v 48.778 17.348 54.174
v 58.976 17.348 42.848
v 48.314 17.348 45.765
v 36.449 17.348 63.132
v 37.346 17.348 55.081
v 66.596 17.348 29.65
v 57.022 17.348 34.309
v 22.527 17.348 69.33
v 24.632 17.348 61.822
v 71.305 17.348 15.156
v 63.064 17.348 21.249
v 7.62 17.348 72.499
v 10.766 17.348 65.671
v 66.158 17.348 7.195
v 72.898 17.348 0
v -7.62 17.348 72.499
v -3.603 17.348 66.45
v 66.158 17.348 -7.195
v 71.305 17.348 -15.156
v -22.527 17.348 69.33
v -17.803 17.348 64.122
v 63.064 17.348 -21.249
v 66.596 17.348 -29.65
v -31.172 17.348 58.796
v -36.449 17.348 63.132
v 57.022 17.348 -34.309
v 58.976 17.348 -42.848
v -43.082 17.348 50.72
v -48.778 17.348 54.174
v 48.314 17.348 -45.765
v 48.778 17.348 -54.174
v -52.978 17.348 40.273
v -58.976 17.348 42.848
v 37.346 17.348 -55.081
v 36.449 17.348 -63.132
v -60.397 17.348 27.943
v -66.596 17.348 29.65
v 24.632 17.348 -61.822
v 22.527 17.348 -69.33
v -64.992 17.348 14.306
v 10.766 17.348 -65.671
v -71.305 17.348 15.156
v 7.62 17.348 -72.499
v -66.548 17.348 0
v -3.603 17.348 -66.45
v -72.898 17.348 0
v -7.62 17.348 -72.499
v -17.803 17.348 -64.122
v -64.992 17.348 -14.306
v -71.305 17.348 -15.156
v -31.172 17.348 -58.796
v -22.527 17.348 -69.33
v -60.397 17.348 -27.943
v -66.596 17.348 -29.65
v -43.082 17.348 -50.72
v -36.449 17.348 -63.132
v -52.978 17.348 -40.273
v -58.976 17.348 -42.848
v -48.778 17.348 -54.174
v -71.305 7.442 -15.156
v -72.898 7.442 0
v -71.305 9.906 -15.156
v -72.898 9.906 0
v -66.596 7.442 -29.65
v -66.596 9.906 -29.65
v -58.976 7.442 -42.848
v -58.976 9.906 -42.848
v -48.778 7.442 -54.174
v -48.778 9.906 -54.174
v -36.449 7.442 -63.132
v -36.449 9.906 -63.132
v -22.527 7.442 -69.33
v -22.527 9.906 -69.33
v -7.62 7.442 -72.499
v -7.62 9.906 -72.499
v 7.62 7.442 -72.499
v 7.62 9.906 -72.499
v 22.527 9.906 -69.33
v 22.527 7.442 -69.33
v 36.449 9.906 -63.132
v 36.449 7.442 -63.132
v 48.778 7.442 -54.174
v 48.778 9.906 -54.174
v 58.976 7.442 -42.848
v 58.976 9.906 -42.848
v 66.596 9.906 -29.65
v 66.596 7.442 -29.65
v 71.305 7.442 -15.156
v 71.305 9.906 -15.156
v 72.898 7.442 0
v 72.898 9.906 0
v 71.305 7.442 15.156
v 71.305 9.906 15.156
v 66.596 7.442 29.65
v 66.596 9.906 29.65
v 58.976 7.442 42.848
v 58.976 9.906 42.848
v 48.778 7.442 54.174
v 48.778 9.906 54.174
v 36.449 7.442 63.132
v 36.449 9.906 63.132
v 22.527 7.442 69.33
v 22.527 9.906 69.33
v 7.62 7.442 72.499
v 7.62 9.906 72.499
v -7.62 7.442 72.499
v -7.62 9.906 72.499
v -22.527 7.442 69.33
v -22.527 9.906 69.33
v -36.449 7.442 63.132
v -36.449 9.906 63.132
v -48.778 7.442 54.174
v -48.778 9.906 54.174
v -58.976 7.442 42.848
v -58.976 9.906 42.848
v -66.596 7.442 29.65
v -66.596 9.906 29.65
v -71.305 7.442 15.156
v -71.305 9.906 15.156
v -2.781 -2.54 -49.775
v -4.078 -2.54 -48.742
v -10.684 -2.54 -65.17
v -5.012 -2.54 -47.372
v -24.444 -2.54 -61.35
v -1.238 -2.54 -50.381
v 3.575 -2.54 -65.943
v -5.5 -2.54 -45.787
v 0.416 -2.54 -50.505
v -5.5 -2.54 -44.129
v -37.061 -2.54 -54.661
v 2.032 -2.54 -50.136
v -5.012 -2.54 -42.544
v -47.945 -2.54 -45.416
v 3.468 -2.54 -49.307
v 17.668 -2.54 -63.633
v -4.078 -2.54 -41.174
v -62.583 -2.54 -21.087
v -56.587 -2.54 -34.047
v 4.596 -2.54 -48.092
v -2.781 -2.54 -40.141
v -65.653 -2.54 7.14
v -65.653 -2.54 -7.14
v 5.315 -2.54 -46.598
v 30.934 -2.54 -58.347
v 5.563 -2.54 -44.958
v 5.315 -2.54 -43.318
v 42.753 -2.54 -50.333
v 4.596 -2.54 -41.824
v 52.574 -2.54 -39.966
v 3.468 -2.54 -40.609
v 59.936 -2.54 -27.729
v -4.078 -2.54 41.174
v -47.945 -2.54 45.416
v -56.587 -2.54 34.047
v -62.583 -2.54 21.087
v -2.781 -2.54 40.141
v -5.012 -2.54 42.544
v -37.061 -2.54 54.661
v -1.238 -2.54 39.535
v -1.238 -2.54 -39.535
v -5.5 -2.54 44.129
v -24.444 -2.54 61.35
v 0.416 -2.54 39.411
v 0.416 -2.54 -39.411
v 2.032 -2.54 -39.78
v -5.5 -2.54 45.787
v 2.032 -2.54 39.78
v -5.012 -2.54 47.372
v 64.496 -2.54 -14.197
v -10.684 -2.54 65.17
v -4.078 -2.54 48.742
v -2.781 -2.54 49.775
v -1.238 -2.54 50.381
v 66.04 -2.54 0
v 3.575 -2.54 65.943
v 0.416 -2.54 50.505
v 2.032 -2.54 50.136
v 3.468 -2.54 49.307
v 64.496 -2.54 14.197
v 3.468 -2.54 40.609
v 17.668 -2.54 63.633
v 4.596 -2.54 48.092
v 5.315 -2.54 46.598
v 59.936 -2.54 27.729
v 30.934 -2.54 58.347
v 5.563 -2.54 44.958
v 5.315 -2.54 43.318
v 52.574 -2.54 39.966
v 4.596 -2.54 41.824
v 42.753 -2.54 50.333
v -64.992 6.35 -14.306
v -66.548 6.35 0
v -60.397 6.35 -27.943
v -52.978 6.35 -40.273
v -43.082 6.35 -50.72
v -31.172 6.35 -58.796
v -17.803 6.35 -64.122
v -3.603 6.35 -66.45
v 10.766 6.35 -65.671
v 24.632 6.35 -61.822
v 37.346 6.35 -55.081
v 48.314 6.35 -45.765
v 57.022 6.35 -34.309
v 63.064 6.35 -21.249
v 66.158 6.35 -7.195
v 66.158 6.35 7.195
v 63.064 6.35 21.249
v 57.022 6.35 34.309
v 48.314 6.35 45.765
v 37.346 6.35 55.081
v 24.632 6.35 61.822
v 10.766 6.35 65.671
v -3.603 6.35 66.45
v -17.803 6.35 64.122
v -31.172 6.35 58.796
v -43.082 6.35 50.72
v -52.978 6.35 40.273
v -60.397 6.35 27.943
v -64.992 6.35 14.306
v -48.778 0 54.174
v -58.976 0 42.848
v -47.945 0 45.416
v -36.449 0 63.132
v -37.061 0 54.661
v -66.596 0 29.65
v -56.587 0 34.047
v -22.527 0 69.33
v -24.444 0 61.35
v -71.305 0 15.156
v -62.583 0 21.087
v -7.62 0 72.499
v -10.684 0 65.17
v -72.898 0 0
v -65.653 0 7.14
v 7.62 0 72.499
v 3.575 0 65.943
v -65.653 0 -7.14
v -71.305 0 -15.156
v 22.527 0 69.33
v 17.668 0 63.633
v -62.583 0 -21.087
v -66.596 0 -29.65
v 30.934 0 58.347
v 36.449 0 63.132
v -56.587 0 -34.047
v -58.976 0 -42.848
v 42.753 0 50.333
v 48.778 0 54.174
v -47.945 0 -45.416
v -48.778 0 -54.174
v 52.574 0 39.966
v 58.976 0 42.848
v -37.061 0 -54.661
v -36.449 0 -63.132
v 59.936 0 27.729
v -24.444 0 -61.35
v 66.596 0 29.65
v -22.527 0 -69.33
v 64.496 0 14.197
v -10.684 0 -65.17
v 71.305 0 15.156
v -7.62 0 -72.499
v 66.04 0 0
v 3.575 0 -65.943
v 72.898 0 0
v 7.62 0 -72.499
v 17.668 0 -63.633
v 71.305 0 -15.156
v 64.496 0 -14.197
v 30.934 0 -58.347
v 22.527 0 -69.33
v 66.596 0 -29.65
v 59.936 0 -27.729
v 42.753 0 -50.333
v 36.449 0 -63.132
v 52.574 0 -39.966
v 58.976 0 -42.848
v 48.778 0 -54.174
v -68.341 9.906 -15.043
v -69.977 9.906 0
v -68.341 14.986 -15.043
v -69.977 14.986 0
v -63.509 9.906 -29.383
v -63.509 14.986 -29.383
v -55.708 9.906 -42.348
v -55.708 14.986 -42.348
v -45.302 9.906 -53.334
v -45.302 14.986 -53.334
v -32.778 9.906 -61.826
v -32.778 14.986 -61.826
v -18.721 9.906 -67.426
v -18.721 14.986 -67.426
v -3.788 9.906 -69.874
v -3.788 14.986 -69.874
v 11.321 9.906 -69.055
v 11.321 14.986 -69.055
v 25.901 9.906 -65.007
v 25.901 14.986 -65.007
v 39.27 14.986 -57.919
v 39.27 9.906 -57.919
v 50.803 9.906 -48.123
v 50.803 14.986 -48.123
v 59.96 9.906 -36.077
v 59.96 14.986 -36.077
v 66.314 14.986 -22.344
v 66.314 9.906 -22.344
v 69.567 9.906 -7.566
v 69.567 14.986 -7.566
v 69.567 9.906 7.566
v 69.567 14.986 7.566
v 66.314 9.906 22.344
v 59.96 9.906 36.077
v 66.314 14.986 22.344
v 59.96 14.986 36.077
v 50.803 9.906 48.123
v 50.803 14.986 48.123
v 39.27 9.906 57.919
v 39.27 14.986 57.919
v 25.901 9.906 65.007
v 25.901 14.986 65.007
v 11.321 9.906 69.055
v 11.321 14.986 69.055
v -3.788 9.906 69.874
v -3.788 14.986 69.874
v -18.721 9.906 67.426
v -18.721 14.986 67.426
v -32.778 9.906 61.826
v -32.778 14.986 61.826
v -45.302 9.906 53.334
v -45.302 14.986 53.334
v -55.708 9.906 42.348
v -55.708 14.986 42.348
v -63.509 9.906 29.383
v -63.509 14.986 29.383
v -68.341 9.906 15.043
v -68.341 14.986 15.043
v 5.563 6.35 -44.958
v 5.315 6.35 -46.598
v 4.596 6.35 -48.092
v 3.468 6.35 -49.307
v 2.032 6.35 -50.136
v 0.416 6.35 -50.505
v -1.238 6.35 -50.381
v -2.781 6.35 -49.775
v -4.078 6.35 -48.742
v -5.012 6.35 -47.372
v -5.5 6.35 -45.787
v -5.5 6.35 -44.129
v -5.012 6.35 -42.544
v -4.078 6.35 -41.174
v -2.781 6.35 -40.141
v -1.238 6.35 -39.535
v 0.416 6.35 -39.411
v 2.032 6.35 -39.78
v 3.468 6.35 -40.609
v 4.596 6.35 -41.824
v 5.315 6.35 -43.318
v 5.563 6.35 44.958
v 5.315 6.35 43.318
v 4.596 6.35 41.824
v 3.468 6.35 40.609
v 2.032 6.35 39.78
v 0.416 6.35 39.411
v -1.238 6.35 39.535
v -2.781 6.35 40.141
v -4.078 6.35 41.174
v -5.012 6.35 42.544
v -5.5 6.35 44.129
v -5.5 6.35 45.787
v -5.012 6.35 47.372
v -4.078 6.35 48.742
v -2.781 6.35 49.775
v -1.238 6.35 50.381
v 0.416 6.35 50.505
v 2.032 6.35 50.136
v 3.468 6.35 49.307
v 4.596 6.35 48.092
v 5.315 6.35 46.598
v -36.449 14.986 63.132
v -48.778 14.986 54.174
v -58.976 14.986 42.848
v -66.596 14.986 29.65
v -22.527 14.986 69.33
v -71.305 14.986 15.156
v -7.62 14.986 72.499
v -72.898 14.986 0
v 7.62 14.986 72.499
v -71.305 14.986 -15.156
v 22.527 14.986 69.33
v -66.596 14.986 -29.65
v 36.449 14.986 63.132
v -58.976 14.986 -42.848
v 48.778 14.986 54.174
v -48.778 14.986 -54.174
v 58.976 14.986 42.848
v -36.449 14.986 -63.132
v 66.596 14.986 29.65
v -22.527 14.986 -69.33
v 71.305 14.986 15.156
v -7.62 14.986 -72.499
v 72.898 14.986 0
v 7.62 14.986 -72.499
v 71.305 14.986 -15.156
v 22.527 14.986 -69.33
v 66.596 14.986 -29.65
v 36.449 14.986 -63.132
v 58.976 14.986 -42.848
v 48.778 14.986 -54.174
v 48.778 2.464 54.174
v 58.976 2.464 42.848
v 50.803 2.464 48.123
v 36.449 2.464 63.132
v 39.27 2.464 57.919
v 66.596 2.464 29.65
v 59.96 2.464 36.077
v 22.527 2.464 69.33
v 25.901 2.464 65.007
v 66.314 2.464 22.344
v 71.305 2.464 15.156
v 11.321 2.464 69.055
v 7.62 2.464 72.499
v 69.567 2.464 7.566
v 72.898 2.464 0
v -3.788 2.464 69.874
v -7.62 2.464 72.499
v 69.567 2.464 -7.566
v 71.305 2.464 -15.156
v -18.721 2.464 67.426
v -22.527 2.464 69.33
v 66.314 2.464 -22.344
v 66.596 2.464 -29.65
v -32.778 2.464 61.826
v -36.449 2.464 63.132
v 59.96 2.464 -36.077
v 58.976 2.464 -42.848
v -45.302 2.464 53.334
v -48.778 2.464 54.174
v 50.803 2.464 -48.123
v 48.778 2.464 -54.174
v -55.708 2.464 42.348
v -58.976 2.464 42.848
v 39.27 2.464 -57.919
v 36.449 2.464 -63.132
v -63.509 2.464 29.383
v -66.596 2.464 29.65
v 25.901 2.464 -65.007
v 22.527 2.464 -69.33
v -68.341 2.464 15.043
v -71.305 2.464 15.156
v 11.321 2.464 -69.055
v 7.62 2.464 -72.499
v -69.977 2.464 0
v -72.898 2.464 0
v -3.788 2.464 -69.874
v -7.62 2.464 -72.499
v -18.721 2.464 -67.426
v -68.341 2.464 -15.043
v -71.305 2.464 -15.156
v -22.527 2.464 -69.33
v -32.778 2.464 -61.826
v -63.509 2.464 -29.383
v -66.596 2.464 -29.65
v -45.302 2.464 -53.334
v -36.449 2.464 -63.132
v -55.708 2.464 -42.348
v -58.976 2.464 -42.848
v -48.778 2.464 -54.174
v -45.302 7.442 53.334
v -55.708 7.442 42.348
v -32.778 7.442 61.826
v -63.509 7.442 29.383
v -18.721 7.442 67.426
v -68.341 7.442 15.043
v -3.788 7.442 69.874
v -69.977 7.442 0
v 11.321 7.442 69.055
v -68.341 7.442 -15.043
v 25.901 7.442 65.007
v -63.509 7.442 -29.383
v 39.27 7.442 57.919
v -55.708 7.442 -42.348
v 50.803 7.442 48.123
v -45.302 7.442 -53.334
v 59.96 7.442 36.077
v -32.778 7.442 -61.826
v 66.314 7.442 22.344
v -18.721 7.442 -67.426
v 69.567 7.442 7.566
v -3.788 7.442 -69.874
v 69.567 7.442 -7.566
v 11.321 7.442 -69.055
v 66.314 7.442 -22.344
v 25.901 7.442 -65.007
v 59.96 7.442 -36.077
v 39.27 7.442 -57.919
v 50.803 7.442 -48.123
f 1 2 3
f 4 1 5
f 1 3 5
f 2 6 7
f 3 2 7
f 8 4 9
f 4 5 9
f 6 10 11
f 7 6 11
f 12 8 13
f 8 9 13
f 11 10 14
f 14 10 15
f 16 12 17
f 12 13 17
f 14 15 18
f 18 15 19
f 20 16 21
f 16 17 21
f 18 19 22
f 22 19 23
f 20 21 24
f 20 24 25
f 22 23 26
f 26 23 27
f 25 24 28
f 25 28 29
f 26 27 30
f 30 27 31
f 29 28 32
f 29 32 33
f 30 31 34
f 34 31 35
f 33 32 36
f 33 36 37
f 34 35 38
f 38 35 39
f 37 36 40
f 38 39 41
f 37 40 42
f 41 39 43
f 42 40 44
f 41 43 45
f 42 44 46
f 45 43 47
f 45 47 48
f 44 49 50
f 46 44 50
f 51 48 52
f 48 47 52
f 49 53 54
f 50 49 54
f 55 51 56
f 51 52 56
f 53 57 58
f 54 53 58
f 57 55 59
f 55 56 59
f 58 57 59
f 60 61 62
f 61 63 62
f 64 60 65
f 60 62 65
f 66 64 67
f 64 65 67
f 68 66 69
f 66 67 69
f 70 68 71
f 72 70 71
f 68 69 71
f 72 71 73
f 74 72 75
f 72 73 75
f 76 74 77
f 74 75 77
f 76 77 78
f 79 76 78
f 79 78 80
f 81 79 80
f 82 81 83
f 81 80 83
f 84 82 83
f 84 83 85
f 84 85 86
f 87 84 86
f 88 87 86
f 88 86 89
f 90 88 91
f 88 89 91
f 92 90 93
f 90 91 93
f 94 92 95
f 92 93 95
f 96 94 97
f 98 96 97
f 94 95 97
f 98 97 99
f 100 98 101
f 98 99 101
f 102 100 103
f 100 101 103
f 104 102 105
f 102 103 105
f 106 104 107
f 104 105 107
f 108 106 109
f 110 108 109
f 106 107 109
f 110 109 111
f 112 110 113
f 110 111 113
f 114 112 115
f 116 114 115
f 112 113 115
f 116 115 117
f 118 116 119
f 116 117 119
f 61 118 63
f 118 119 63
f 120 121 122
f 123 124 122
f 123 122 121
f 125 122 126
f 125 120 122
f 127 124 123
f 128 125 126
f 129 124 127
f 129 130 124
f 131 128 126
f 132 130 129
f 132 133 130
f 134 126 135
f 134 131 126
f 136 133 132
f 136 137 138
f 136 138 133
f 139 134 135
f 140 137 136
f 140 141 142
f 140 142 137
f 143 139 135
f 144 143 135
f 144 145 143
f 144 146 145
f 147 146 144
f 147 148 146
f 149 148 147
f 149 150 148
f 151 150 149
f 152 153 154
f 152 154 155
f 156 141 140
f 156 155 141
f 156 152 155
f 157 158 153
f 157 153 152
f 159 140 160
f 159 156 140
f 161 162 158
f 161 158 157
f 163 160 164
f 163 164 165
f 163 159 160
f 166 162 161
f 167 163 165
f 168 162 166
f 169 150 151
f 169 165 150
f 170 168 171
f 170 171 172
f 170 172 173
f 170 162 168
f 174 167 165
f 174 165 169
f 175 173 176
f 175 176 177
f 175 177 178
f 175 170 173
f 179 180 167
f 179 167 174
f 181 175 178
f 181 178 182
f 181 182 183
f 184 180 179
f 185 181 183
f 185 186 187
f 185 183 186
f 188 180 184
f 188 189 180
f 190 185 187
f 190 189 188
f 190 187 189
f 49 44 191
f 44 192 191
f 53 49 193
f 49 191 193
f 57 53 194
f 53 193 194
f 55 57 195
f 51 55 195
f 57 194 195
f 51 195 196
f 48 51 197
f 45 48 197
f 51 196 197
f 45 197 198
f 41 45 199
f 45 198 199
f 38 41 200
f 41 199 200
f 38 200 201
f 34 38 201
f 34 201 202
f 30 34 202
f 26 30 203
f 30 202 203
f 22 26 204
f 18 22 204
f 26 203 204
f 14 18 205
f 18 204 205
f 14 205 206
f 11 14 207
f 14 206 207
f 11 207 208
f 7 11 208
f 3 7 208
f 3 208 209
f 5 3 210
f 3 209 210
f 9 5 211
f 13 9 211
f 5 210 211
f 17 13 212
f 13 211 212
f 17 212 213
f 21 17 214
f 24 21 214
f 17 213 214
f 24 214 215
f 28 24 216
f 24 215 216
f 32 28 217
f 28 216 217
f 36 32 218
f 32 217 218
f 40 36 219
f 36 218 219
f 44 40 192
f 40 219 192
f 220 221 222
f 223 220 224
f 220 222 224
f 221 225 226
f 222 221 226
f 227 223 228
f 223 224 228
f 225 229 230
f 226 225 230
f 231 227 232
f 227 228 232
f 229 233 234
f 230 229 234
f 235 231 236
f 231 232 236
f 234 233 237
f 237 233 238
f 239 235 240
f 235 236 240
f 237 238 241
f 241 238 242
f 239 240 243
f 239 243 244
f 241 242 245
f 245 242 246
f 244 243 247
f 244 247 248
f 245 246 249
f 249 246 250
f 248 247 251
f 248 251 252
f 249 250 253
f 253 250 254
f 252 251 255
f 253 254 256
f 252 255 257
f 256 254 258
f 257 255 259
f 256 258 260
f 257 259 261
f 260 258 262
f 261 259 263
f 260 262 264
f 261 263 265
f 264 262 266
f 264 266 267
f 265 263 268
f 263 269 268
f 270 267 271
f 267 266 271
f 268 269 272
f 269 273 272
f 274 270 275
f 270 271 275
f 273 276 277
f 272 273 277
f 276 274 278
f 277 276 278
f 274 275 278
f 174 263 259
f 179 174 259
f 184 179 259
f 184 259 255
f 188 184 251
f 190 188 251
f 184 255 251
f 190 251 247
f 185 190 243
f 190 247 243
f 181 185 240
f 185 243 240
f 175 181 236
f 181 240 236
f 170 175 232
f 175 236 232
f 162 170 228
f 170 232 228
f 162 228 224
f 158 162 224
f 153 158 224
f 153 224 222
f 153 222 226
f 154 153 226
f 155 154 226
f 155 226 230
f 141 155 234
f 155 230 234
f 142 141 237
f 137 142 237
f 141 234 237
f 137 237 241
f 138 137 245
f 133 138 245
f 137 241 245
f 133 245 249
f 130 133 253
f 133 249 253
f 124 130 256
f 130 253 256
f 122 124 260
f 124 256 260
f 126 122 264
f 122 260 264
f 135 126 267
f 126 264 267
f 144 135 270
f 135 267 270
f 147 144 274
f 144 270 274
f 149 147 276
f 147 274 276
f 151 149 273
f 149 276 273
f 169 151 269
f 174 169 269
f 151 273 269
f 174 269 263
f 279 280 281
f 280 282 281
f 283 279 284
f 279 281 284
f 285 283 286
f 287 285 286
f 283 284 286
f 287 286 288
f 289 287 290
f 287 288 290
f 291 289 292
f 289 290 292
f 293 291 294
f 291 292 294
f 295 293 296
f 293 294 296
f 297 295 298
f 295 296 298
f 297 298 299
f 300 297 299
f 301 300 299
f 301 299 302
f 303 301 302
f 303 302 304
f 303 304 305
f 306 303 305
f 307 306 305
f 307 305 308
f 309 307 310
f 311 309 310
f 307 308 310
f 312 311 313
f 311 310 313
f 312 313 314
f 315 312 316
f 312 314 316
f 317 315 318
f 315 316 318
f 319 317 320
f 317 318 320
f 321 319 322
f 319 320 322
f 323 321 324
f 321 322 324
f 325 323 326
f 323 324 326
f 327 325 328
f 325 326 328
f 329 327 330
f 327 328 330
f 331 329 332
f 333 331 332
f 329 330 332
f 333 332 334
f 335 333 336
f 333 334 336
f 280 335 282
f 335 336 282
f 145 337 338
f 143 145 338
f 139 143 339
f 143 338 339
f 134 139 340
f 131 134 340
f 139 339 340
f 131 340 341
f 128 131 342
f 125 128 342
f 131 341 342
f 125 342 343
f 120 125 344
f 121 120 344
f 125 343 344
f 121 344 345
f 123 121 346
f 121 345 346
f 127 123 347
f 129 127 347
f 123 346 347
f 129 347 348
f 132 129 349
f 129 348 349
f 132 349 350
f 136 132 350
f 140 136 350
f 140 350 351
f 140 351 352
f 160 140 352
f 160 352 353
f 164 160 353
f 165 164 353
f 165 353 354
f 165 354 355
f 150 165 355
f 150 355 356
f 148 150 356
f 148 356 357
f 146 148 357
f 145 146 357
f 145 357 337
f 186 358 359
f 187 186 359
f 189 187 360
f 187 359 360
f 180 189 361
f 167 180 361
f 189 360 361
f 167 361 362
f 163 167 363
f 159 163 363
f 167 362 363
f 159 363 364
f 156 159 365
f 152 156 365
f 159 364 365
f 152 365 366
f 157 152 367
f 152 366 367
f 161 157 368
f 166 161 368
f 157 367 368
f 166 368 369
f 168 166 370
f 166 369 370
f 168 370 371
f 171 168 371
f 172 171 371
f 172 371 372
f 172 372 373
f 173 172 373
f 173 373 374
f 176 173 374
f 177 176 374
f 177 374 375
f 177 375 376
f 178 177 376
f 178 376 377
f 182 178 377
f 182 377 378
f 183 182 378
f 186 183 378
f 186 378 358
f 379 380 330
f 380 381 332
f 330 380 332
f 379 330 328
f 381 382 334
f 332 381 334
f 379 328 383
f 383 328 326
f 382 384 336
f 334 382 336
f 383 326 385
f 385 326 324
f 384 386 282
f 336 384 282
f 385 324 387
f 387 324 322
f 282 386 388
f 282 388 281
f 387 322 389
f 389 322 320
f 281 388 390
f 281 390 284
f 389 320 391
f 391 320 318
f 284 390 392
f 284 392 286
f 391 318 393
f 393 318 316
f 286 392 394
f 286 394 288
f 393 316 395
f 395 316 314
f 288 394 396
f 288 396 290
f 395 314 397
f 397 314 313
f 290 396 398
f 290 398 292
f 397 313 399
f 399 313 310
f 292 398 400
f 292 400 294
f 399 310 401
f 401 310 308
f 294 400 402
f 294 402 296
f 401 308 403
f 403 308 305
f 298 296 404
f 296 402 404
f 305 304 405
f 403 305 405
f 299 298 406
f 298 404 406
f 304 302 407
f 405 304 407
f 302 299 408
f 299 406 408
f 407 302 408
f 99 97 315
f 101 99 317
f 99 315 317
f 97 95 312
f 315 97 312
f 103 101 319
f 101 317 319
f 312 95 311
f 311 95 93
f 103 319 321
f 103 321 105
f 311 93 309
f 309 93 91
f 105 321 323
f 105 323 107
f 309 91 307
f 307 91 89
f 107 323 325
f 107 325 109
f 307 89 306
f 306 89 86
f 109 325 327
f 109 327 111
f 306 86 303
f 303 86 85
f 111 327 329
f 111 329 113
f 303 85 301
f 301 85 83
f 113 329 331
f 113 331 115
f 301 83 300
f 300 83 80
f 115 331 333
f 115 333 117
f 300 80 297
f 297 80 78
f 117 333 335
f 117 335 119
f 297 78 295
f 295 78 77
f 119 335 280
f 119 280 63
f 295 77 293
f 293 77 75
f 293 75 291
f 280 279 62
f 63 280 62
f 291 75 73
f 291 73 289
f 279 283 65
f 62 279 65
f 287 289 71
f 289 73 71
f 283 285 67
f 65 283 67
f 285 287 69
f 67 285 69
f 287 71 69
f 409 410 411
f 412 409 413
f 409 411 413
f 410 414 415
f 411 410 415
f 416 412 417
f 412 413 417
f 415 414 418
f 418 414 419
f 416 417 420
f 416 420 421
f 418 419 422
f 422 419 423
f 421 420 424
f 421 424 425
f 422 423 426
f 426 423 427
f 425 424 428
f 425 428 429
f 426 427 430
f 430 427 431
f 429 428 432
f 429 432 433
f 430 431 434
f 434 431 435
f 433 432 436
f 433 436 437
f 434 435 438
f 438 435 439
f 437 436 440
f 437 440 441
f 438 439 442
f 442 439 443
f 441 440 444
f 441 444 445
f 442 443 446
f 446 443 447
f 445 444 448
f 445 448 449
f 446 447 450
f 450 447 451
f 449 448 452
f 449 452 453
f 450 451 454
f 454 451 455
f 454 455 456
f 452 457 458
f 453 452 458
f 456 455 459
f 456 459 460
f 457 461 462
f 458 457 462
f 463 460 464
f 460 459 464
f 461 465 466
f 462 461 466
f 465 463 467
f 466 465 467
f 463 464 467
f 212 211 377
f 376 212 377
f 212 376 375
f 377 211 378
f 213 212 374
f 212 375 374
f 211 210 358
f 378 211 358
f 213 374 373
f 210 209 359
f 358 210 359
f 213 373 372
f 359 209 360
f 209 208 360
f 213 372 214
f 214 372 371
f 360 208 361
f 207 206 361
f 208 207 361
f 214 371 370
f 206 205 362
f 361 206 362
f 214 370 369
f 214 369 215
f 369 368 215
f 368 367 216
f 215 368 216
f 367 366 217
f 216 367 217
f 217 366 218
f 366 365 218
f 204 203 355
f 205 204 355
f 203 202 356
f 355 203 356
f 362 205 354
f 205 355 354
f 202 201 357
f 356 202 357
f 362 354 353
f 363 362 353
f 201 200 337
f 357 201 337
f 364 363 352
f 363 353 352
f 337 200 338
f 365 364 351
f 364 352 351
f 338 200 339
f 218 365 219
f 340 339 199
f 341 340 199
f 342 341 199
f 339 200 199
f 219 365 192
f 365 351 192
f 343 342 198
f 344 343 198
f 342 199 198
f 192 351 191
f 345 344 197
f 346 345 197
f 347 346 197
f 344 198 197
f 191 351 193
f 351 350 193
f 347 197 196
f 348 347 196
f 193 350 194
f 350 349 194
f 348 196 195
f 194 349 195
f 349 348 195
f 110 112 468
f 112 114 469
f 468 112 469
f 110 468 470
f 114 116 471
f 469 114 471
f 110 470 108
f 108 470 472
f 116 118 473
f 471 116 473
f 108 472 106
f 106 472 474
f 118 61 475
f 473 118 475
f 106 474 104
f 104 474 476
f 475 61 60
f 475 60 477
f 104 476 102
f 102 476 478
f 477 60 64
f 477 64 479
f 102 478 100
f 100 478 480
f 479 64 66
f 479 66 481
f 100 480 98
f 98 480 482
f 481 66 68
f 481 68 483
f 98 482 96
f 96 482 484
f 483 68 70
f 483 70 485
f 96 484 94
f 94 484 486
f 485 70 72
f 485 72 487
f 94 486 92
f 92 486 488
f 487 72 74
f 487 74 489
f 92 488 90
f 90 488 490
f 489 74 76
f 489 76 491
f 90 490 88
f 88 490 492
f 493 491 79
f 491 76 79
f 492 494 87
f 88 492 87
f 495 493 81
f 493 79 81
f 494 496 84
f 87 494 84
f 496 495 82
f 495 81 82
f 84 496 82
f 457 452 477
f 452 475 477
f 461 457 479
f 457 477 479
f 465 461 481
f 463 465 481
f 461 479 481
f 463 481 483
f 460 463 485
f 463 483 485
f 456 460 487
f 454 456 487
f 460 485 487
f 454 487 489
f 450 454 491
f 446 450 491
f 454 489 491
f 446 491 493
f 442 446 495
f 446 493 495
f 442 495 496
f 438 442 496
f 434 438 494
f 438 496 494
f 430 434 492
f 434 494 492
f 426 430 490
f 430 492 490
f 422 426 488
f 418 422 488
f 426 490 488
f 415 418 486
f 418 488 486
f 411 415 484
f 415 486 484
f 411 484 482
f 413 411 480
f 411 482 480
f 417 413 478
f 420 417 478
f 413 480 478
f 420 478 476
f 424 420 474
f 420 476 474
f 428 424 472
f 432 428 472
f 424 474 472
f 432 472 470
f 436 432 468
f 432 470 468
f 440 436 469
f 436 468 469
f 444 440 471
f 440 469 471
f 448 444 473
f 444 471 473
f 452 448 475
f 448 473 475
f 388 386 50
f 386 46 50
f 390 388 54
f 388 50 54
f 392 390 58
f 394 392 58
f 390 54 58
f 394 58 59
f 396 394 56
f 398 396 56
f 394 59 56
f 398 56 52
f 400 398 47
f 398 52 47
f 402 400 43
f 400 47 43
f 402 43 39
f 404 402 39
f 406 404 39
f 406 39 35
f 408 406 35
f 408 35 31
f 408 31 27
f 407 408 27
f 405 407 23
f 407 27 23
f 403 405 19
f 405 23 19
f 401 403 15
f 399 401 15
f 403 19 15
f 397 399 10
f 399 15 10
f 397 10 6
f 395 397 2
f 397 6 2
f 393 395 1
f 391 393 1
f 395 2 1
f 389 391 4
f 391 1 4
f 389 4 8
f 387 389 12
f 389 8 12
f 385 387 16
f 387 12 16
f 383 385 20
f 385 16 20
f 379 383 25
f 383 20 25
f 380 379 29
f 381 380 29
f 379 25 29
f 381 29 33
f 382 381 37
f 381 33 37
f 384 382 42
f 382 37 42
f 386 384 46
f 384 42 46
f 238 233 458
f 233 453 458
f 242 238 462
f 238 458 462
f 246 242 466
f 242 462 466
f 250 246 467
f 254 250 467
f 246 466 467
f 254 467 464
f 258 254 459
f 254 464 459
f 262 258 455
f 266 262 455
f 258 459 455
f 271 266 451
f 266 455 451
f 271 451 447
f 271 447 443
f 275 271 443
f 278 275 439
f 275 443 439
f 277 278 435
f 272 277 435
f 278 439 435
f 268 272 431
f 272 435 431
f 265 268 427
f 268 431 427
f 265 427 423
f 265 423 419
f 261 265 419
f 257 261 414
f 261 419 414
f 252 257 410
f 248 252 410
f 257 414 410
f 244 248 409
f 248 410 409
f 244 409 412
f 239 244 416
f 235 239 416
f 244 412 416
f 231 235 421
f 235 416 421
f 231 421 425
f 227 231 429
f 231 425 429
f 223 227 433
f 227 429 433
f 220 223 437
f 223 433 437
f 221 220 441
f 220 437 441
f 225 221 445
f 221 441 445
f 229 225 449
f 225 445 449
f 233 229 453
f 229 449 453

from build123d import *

# Parameters (mm, degrees)
SKETCH6_R                                = 66.04
BOSS_EXTRUDE1_DEPTH                      = 2.54
PIPE_TAP_DRILL_FOR_1_4_TAP_RELIEF_VALV_D = 11.1252
PIPE_TAP_DRILL_FOR_1_4_TAP_VENT_VALVE_D  = 11.1252


with BuildPart() as part:
    # Sketch1 → Revolve1 (revolve)
    with BuildSketch(Plane.XY, mode=Mode.PRIVATE) as revolve1_sk:
        Polygon((0, 0), (72.898, 0), (72.898, 2.4638), (69.977, 2.4638), (69.977, 7.4422), (72.898, 7.4422), (72.898, 9.906), (69.977, 9.906), (69.977, 14.986), (72.898, 14.986), (72.898, 17.3482), (66.548, 17.3482), (66.548, 6.35), (0, 6.35), align=None)
    revolve(revolve1_sk.sketch.rotate(Axis((0, 48.192213231, 0), (0, -1, 0)), 180), axis=Axis((0, 48.192213231, 0), (0, -1, 0)))

    # Sketch6 → Boss-Extrude1 (add)
    with BuildSketch(Plane.XZ):
        Circle(SKETCH6_R)
    extrude(amount=BOSS_EXTRUDE1_DEPTH)

    # Pipe Tap Drill for 1/4 Tap - Relief Valve (through all)
    with Locations(Plane(origin=(0, -2.54, 0), x_dir=(-1, 0, 0), z_dir=(0, -1, 0))):
        with Locations((0, 44.958)):
            Hole(PIPE_TAP_DRILL_FOR_1_4_TAP_RELIEF_VALV_D / 2)

    # Pipe Tap Drill for 1/4 Tap - Vent Valve (through all)
    with Locations(Plane(origin=(0, -2.54, 0), x_dir=(-1, 0, 0), z_dir=(0, -1, 0))):
        with Locations((0, -44.958)):
            Hole(PIPE_TAP_DRILL_FOR_1_4_TAP_VENT_VALVE_D / 2)


solid = part.part
